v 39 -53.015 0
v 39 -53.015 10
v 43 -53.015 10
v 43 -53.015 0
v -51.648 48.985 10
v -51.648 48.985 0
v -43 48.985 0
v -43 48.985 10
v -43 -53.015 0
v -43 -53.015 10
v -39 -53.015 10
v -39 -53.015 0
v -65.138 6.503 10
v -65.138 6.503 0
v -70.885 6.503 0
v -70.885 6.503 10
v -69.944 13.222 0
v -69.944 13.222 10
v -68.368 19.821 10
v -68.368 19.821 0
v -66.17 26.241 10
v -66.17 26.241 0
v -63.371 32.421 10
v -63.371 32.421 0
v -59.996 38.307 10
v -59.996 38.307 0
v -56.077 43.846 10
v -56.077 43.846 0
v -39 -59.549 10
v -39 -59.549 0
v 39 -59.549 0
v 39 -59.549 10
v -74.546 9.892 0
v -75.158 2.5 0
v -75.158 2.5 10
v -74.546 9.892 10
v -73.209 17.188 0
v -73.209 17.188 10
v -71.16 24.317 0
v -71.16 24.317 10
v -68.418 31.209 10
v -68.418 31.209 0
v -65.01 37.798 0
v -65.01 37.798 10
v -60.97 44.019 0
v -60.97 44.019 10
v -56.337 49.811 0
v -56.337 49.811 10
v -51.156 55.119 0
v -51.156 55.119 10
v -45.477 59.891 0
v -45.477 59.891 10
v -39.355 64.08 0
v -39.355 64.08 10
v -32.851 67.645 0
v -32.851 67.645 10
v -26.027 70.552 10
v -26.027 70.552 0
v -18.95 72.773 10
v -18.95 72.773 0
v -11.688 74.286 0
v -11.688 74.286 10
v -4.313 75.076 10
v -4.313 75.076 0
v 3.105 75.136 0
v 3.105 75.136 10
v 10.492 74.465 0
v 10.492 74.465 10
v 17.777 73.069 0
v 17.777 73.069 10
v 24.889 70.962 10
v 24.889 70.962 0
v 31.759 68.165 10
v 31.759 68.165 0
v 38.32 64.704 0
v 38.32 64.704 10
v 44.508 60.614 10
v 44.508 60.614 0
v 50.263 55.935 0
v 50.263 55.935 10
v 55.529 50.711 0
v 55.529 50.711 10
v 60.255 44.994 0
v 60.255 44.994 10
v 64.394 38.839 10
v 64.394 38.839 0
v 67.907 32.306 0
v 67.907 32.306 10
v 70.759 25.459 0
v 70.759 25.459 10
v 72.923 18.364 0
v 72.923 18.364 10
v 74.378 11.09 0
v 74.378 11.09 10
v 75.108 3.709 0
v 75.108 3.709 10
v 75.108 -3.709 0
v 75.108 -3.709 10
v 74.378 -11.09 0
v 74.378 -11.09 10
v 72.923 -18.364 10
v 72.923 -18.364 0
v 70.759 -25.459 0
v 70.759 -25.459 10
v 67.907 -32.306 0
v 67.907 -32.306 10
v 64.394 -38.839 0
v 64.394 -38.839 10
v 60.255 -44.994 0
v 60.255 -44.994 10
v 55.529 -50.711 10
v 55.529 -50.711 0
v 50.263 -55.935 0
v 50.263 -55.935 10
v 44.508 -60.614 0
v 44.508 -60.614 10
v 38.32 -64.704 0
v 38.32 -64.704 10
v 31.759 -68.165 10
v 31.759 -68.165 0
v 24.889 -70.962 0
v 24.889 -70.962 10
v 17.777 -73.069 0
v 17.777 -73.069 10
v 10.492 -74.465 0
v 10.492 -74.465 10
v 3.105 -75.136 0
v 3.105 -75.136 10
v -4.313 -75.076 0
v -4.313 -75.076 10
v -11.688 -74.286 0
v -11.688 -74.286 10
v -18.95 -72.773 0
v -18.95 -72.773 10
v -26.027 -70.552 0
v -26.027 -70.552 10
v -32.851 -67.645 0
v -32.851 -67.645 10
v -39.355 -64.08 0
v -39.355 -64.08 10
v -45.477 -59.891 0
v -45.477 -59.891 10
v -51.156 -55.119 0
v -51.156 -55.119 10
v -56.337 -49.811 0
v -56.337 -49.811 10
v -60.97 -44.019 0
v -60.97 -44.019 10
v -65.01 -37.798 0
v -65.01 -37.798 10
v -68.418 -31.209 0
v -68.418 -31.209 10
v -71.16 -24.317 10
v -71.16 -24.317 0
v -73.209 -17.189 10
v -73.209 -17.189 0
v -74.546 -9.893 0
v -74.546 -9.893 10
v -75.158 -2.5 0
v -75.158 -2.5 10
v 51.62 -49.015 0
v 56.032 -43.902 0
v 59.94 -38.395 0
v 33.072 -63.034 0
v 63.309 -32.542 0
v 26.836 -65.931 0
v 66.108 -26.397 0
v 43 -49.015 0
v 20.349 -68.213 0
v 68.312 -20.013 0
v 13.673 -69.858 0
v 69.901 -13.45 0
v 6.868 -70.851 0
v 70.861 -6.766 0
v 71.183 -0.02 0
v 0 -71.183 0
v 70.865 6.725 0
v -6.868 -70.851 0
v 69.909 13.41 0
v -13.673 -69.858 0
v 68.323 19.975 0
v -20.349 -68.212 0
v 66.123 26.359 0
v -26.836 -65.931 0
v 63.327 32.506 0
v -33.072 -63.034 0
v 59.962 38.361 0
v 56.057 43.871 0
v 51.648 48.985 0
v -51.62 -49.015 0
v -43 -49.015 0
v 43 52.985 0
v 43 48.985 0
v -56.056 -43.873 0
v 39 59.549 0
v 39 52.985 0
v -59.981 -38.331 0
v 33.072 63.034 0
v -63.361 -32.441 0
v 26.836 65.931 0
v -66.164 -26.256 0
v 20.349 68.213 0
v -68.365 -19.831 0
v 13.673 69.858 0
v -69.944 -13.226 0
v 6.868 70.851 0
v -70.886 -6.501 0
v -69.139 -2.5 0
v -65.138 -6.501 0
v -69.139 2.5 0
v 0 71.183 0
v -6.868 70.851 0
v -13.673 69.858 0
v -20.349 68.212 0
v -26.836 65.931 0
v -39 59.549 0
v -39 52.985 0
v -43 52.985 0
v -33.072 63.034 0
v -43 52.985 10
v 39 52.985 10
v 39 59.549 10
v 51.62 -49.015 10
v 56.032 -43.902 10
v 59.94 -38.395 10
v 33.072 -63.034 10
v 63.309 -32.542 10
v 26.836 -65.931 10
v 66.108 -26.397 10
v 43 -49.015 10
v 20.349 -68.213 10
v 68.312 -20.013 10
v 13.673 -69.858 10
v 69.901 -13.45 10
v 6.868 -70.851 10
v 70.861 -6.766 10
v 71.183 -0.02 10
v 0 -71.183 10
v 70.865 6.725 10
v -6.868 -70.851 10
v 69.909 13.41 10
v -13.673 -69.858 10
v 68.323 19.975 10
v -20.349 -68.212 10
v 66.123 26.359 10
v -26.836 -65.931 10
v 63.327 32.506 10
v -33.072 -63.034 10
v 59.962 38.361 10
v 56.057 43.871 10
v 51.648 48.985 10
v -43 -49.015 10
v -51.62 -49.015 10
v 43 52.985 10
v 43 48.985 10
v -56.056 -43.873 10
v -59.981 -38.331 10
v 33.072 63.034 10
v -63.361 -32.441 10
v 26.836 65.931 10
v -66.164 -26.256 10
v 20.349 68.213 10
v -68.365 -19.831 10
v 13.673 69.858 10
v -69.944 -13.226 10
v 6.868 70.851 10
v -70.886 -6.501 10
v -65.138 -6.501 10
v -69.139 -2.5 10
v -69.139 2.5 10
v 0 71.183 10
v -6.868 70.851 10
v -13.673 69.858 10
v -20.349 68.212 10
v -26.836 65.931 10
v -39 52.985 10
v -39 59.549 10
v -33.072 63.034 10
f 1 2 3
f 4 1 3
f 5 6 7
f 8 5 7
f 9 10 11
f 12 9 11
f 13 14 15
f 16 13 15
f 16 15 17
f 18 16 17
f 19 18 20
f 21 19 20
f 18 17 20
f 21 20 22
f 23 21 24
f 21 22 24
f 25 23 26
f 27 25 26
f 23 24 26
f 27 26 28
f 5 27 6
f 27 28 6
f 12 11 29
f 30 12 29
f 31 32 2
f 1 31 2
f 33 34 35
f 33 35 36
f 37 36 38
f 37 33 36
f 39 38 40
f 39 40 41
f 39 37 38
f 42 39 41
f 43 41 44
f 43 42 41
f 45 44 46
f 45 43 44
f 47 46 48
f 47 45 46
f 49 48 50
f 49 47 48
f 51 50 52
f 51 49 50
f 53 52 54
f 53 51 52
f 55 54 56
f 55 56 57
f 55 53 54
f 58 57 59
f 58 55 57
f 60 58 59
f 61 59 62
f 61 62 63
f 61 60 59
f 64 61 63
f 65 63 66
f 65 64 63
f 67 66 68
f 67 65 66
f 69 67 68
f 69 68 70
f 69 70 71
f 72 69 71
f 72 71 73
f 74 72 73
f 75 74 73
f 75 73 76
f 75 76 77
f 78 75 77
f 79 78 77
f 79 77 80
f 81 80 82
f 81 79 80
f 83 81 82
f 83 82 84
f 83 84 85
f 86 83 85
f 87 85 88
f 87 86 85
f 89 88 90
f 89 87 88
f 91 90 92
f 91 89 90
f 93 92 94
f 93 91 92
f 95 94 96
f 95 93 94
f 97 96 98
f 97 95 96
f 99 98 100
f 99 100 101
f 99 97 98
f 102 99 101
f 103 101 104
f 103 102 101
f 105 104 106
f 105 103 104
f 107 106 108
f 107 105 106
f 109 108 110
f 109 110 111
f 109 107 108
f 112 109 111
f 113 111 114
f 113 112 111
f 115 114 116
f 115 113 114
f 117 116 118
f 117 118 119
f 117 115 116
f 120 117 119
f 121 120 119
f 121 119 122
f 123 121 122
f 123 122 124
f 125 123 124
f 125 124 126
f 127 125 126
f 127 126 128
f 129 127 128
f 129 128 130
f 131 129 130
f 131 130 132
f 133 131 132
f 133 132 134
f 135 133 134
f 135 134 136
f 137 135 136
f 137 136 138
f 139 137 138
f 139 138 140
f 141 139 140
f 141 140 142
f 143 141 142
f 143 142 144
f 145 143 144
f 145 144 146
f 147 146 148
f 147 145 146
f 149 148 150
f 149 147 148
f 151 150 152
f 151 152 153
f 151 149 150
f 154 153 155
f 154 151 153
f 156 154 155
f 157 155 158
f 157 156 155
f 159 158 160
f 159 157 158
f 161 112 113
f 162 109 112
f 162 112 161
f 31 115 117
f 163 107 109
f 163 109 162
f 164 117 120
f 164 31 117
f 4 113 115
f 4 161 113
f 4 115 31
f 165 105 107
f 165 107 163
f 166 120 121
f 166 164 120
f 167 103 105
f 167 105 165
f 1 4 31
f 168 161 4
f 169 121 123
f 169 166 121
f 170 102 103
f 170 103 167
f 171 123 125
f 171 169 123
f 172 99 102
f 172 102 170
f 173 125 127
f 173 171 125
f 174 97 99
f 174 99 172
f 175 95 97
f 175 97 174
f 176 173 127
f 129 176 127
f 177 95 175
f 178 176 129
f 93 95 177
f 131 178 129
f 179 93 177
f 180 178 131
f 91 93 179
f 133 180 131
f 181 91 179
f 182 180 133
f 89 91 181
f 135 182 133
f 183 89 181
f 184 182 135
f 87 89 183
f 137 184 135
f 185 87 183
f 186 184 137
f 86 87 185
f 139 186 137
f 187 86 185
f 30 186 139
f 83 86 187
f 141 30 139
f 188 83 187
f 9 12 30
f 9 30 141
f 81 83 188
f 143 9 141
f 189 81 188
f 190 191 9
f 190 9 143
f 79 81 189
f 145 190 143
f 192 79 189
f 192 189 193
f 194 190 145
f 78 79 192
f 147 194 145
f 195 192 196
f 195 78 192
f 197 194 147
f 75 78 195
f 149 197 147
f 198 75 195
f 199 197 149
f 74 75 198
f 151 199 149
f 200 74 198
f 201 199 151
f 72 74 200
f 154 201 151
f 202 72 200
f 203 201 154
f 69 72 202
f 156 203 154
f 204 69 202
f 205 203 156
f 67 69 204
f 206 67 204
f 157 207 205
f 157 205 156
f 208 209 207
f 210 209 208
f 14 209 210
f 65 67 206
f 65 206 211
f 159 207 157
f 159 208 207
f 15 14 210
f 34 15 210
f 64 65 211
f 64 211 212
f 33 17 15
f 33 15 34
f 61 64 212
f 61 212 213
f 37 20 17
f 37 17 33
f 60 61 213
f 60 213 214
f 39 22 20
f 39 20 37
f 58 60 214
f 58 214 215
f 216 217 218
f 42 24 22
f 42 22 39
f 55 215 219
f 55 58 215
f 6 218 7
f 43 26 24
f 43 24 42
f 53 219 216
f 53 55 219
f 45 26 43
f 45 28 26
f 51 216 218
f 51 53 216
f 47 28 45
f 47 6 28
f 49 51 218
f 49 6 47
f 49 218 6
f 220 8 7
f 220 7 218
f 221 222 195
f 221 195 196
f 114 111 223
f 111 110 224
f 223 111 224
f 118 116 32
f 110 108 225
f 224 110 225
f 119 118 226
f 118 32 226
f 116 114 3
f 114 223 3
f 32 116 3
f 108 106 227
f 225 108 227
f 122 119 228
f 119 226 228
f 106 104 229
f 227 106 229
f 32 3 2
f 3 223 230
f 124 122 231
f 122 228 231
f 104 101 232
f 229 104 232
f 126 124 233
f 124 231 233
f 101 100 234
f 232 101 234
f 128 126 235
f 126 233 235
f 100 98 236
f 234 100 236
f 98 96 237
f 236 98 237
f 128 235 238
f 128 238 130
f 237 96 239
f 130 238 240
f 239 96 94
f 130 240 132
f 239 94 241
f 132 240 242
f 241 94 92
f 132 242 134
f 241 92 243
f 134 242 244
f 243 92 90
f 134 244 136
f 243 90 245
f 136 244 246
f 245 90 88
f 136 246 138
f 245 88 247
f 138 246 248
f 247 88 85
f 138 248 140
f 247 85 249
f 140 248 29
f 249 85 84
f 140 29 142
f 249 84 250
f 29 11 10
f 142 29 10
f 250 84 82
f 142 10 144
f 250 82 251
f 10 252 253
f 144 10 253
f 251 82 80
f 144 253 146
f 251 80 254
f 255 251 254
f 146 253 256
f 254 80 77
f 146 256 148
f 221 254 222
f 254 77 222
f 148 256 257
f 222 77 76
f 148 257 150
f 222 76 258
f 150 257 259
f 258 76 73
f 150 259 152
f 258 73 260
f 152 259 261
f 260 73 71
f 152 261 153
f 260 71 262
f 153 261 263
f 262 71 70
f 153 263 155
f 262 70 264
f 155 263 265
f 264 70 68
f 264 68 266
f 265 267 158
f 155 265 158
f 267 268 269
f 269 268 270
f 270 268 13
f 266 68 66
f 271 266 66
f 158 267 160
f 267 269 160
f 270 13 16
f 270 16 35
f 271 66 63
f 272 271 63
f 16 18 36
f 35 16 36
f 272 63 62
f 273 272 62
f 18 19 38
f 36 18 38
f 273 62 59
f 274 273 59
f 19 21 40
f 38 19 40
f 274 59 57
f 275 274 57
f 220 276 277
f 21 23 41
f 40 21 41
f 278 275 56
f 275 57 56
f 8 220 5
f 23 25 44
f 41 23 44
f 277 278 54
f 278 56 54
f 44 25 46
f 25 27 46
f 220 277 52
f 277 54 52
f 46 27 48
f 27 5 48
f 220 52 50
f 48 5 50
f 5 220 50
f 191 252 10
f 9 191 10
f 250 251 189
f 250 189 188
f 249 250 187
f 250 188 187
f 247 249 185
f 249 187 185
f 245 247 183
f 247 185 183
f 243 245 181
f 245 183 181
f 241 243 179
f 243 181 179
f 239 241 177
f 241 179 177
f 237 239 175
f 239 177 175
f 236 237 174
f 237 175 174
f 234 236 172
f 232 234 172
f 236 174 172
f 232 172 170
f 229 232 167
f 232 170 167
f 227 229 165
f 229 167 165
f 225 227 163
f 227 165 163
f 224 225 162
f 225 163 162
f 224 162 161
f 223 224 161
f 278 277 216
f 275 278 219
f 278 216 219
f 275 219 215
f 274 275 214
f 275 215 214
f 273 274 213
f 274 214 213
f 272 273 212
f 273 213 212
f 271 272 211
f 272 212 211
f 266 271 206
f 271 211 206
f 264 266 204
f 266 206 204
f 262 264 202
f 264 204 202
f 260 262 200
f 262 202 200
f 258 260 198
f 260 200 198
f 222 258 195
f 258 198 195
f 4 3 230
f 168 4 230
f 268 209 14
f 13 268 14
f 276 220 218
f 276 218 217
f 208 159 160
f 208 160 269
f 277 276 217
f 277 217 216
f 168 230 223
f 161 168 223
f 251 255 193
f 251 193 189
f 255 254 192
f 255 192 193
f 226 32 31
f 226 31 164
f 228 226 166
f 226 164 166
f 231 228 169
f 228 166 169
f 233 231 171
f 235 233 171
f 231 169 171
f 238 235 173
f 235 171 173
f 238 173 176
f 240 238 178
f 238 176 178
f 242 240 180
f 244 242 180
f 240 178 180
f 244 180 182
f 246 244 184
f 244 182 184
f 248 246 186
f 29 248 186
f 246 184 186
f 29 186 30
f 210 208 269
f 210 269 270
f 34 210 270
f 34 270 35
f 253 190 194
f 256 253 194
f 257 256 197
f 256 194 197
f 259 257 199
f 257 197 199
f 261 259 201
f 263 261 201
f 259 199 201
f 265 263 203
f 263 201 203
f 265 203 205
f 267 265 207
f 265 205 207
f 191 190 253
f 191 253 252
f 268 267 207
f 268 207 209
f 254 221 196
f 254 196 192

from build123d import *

# Parameters (mm, degrees)
BOSS_EXTRUDE1_DEPTH = 10
BOSS_EXTRUDE2_DEPTH = 10


with BuildPart() as part:
    # Sketch1 → Boss-Extrude1 (new body)
    with BuildSketch(Plane(origin=(0, 0, 0), x_dir=(0, 1, 0), z_dir=(0, 0, 1))):
        with BuildLine():
            Line((-2.500306968, 75.158422449), (-2.500306968, 71.139205273))
            Line((-2.500306968, 71.139205273), (-2.500306968, 69.139205273))
            Line((-2.500306968, 69.139205273), (2.500252848, 69.139205273))
            Line((2.500252848, 69.139205273), (2.500252848, 71.139196387))
            Line((2.500252848, 71.139196387), (2.500252848, 75.15842425))
            ThreePointArc((2.500252848, 75.15842425), (2.7075e-05, -75.2), (-2.500306968, 75.158422449))
        make_face()
        with BuildLine():
            Line((-6.501119998, 70.885625945), (-6.501119998, 65.138162172))
            Line((-6.501119998, 65.138162172), (6.502991614, 65.138162172))
            Line((6.502991614, 65.138162172), (6.502991614, 70.885454269))
            ThreePointArc((6.502991614, 70.885454269), (-0.000939736, -71.18311967), (-6.501119998, 70.885625945))
        make_face(mode=Mode.SUBTRACT)
    extrude(amount=BOSS_EXTRUDE1_DEPTH)

    # Sketch3 → Boss-Extrude2 (add)
    with BuildSketch(Plane.XY.offset(10)):
        Polygon((42.999947541, -53.014633283), (42.999947541, -49.014633283), (55.729863476, -49.014633283), (38.999947541, -62.774922679), (38.999947541, -53.014633283), align=None)
        Polygon((42.999947541, 52.985366717), (42.999947541, 48.985366717), (54.948623561, 48.985366717), (38.999947541, 61.804425072), (38.999947541, 52.985366717), align=None)
        Polygon((-43.000052459, 52.985366717), (-39.000052459, 52.985366717), (-39.000052459, 61.804425072), (-54.585609019, 48.985366717), (-43.000052459, 48.985366717), align=None)
        Polygon((-43.000052459, -53.014633283), (-39.000052459, -53.014633283), (-39.000052459, -62.774922679), (-54.585609019, -49.014633283), (-43.000052459, -49.014633283), align=None)
    extrude(amount=-BOSS_EXTRUDE2_DEPTH)


solid = part.part
